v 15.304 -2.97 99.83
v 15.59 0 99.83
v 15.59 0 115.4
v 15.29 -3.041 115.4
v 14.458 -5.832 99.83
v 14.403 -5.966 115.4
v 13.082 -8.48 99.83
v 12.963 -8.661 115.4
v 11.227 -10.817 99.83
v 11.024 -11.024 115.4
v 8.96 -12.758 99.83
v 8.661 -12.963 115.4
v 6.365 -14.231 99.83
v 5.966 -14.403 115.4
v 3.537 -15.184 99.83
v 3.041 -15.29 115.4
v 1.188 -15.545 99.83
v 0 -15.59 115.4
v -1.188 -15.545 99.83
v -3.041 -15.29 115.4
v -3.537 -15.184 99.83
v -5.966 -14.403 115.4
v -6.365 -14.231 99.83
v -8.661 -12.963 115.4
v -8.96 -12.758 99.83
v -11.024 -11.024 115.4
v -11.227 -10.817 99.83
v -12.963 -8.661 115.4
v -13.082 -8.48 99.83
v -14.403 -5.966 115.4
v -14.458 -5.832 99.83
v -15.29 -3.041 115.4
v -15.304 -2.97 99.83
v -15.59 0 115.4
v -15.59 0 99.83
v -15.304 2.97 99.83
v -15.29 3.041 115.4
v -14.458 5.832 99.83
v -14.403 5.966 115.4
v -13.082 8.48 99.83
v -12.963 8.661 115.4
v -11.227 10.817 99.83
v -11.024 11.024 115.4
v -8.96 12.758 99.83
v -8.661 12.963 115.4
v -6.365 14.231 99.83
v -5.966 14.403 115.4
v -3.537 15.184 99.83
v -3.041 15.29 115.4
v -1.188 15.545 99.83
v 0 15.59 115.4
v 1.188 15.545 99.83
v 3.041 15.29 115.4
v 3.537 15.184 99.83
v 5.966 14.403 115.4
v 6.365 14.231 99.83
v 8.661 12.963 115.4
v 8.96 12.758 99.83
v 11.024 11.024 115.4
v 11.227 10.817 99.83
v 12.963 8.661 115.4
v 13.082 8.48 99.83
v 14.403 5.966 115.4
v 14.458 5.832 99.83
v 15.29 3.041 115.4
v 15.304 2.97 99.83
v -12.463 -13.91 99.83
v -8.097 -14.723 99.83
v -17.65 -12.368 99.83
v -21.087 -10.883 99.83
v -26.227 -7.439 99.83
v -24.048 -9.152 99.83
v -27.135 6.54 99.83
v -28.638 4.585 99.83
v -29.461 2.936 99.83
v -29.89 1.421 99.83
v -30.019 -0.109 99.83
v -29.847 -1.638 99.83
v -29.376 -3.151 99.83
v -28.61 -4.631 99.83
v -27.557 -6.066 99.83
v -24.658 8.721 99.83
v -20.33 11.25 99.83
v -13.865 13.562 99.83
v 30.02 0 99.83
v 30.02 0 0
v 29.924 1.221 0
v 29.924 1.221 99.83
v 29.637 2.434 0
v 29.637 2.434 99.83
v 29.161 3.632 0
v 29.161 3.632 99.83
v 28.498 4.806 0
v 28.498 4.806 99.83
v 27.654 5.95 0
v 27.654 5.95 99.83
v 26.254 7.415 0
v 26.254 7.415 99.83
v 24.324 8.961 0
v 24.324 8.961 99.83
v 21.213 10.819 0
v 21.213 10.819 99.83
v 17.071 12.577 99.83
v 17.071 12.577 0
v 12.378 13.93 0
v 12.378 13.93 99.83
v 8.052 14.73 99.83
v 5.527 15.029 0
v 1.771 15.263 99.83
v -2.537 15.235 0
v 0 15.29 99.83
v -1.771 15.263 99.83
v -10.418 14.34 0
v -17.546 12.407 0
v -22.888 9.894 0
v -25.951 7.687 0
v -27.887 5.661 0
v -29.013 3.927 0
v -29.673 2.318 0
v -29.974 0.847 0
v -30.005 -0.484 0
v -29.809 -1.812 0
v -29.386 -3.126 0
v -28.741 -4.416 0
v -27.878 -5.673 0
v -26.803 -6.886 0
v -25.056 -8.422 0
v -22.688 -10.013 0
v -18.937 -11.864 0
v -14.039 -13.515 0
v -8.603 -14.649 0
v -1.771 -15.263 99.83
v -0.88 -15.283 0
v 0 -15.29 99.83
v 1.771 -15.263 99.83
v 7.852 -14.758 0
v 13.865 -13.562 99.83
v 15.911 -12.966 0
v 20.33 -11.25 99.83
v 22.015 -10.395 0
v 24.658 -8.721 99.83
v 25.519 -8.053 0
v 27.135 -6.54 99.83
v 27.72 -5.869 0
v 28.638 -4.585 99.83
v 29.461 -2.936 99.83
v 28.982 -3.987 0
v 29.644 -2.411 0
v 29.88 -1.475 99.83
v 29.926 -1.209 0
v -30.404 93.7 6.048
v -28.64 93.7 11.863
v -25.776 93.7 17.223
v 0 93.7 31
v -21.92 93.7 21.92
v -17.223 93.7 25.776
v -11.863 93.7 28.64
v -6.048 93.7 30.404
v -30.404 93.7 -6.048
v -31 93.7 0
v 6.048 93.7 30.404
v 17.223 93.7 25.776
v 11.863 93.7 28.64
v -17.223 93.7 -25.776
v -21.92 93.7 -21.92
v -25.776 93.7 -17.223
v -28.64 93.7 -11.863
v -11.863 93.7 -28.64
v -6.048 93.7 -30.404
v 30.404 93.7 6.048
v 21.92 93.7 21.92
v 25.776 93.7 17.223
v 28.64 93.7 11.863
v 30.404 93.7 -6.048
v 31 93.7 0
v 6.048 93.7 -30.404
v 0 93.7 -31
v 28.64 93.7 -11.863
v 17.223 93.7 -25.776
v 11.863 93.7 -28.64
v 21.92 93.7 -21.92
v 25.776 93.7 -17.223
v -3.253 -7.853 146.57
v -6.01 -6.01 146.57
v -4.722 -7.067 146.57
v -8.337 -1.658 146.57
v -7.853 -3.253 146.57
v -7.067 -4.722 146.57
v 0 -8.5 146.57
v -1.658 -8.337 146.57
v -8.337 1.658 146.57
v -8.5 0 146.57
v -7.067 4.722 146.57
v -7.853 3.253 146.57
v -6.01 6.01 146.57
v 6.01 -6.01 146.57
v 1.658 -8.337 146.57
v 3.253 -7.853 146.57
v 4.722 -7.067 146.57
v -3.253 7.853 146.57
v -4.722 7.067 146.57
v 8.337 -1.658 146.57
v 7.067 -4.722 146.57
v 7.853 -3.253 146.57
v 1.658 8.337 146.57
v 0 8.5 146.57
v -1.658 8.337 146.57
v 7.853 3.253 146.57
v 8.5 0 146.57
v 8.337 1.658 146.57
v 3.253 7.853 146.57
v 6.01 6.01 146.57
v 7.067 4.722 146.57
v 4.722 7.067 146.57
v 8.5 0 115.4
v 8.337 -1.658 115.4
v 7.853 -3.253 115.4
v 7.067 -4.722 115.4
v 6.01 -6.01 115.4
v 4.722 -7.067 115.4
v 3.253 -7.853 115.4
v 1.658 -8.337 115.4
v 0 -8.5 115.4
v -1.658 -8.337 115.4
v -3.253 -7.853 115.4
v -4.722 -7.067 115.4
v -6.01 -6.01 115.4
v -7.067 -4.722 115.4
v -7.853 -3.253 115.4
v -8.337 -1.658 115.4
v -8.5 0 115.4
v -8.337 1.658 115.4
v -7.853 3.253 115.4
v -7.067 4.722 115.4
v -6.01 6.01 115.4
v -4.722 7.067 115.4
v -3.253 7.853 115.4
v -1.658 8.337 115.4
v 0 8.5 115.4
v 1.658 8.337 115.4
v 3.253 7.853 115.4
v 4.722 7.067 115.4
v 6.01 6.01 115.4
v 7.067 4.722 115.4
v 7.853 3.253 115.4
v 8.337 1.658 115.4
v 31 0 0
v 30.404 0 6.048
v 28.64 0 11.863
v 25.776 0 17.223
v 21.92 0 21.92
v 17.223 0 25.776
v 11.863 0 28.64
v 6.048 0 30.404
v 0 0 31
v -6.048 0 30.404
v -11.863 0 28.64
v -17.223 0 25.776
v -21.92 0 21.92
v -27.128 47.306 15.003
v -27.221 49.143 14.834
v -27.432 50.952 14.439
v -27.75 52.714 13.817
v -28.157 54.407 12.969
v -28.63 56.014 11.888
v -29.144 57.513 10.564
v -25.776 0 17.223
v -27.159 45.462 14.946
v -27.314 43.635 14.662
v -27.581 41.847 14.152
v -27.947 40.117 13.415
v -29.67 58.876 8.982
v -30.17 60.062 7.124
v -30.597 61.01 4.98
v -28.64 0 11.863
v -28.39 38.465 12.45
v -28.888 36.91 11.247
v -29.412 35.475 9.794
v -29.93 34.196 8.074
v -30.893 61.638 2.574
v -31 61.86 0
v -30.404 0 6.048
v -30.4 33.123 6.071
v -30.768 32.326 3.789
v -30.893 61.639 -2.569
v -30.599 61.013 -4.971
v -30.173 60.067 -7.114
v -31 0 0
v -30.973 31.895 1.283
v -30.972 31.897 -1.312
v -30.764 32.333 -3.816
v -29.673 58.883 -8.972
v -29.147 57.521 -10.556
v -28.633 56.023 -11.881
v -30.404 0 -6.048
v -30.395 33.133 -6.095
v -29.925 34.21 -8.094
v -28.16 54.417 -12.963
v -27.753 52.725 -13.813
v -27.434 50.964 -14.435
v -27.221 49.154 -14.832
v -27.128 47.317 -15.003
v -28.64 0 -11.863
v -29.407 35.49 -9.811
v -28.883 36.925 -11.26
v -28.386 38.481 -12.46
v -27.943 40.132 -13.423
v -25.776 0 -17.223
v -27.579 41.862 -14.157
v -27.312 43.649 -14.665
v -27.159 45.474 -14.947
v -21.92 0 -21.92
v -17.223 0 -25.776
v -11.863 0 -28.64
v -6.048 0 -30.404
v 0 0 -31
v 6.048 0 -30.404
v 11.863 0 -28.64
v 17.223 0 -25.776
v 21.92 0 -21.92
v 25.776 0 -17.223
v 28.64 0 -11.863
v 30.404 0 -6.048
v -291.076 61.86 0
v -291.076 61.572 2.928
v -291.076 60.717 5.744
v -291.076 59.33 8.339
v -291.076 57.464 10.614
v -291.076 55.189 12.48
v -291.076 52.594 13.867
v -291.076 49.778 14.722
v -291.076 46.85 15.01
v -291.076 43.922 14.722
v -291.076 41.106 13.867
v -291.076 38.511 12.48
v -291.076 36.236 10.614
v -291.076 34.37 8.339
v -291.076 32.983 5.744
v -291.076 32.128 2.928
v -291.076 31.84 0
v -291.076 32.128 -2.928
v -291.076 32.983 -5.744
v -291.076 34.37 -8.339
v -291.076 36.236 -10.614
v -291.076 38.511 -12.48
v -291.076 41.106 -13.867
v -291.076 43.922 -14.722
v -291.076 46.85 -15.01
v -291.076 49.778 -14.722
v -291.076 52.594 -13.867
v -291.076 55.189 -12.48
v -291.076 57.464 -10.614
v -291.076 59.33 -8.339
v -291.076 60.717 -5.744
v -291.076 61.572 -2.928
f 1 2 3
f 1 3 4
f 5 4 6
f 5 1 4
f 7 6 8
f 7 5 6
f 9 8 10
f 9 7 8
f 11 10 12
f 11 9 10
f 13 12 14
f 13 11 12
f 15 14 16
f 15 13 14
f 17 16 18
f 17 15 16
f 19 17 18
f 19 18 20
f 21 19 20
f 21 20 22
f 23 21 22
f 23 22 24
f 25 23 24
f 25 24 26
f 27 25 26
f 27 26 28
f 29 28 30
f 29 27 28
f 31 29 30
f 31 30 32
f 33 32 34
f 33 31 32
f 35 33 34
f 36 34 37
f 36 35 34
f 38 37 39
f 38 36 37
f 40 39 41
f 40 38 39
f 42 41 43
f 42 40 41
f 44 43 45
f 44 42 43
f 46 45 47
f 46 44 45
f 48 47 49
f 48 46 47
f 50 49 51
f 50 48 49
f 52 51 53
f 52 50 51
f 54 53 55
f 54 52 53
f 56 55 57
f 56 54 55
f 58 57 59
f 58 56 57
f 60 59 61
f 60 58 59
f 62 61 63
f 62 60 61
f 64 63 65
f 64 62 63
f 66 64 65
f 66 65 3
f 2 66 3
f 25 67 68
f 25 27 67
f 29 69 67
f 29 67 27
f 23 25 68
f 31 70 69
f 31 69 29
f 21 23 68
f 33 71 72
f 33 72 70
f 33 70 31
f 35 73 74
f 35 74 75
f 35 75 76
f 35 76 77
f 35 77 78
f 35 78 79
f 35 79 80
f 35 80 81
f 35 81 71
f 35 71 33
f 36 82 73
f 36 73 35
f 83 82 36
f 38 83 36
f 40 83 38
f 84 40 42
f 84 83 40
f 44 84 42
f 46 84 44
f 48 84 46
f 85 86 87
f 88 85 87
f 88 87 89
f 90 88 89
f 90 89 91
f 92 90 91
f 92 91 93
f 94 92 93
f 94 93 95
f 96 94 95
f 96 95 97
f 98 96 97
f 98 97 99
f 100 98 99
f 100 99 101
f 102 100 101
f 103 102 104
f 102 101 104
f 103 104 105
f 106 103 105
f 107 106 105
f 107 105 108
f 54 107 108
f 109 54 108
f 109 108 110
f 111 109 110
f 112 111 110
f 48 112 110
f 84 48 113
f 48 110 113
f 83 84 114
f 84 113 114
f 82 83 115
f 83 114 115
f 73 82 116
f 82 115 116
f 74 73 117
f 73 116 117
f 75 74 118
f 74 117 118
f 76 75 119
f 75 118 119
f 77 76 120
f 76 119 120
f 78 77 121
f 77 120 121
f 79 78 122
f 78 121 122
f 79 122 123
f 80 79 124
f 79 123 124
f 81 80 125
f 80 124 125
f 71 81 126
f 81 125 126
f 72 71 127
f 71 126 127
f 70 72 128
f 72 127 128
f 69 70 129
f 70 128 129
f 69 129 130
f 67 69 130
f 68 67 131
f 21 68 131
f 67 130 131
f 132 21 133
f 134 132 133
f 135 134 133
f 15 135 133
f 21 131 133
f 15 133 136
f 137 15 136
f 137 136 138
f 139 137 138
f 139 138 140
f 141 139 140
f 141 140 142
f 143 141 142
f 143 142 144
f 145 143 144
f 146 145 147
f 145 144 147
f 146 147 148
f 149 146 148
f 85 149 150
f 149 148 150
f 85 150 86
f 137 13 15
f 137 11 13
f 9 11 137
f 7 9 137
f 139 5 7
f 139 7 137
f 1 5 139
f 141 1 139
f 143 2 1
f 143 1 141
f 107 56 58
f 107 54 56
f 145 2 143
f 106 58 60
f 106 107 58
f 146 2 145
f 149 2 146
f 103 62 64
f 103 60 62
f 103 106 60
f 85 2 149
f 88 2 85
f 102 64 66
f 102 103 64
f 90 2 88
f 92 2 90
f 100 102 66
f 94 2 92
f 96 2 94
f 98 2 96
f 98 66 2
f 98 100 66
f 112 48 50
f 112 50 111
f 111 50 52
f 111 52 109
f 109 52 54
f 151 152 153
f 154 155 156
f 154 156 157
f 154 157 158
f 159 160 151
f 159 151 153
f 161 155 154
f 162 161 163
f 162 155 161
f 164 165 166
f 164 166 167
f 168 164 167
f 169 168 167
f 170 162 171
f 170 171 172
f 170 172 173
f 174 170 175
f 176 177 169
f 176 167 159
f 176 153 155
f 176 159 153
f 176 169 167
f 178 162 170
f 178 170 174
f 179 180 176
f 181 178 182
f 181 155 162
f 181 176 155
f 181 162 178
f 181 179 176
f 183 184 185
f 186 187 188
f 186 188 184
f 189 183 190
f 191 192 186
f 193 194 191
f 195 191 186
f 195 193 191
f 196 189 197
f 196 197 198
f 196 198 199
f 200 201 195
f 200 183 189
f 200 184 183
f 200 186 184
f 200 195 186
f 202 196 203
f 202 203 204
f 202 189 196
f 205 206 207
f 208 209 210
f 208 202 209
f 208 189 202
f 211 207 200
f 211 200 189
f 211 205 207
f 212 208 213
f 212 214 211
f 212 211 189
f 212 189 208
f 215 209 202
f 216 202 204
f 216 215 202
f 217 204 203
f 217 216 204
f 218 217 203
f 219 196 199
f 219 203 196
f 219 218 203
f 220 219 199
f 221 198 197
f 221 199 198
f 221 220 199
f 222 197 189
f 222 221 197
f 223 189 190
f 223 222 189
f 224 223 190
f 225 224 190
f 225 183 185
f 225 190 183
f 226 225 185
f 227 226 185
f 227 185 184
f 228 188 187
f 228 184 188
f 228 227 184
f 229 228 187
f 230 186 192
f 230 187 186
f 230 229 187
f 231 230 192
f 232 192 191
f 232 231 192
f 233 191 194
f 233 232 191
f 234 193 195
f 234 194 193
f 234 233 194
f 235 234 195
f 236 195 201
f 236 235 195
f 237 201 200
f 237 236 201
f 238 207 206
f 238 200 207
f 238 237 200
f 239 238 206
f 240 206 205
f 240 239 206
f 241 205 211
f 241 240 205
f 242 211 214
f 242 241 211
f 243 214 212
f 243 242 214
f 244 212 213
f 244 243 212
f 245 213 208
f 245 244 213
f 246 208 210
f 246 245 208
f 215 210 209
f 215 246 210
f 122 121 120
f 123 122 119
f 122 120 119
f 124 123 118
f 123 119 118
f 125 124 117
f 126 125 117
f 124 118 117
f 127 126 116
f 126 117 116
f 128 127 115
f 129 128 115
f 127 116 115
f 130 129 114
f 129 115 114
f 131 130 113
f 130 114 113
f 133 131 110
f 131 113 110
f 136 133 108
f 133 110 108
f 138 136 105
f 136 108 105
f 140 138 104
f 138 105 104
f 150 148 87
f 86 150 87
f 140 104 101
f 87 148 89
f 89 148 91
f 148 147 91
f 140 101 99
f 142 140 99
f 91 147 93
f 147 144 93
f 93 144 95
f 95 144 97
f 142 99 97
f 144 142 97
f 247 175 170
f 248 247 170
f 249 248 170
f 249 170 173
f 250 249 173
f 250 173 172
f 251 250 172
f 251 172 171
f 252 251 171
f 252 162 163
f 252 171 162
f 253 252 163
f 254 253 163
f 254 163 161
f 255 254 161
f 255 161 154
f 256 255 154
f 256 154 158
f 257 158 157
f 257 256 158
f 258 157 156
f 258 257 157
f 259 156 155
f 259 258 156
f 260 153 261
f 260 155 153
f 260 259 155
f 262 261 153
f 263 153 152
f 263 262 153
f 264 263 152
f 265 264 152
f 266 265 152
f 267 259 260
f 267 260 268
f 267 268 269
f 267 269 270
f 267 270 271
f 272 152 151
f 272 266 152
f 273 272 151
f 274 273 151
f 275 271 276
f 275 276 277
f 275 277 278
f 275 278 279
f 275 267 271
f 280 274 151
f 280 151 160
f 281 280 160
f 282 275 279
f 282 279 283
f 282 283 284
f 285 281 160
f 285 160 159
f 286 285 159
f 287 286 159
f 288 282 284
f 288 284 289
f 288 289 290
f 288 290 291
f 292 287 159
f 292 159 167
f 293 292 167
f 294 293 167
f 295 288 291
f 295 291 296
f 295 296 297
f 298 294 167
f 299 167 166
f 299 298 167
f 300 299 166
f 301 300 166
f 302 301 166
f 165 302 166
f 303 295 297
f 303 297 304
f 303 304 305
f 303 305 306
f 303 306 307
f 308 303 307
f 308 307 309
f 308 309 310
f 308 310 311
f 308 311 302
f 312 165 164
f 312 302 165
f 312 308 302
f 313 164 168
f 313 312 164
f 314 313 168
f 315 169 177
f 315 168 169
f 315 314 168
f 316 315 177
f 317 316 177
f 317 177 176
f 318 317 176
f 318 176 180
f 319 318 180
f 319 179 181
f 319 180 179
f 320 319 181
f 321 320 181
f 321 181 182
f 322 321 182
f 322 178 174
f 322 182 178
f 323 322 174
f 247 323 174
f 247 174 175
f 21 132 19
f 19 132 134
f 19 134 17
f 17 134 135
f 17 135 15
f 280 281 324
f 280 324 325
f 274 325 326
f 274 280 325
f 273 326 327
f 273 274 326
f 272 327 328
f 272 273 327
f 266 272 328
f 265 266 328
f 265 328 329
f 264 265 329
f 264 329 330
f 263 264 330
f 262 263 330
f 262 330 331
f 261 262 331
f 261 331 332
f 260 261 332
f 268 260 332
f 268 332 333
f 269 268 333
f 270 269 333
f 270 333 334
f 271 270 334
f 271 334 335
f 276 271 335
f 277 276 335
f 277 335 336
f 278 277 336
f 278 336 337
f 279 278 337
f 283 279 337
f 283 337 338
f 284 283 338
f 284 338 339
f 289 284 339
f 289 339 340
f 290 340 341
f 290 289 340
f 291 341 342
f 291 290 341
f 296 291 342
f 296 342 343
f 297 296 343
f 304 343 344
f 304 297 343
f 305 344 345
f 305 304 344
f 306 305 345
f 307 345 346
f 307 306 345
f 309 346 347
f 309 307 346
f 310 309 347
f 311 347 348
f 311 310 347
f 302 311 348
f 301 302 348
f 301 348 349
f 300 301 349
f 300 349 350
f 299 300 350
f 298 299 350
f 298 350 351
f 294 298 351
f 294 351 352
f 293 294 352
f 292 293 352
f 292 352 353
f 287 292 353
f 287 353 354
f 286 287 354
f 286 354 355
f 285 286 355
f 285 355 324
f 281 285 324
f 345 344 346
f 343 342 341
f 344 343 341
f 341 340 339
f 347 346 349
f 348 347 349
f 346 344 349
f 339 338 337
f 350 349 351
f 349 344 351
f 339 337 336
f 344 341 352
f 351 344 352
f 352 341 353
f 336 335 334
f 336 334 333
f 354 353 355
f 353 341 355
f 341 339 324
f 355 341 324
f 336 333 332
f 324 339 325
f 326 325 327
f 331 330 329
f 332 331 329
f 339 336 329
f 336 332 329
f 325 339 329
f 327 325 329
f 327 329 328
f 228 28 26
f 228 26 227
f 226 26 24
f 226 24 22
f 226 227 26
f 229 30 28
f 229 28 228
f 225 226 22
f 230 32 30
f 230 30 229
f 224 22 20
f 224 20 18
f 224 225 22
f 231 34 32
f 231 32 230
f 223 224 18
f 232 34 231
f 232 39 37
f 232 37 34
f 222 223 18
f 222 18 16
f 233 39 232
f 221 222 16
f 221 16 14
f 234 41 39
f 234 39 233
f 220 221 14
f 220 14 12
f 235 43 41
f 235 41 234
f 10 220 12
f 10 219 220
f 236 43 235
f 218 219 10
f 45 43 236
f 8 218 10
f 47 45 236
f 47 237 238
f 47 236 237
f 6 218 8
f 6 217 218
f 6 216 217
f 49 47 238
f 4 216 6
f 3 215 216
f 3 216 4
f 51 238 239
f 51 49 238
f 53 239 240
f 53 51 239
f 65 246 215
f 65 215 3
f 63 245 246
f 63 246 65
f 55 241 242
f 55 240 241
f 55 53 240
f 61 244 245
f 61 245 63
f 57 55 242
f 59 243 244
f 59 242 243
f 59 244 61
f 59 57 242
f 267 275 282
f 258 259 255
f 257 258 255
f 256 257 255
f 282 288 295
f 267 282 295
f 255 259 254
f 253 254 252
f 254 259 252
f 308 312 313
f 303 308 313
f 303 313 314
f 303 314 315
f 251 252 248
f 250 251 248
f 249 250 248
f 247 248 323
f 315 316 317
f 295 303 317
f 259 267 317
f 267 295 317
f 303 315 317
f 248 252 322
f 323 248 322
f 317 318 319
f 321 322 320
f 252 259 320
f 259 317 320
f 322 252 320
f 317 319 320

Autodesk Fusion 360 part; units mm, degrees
sketch "Sketch1" plane through (0, 0, 0) normal (0, 0, 1) x (1, 0, 0)
  ellipse E0 centre (0, 0) end of major axis (30.02, 0) minor radius 15.29
  line L0 (-30.02, 0) -> (30.02, 0) construction
  line L1 (0, -15.29) -> (0, 15.29) construction
  dimension "d1" = 60.04
  dimension "d2" = 30.58
extrude "Extrude1" add sketch "Sketch1" along normal blind 99.83 makes body 1
sketch "Sketch2" plane through (0, 0, 0) normal (0, 0, 1) x (1, 0, 0)
  circle A0 centre (0, 0) radius 15.59
  dimension "d5" = 31.18
extrude "Extrude3" add sketch "Sketch2" along normal blind 15.57 from surface at 99.83 bodies 1
sketch "Sketch3" plane through (0, 0, 0) normal (0, 0, 1) x (1, 0, 0)
  circle A0 centre (0, 0) radius 8.5
  dimension "d23" = 17
extrude "Extrude4" add sketch "Sketch3" along normal blind 31.17 from surface at 115.4 bodies 1
sketch "Sketch5" plane through (0, 0, 0) normal (0, 1, 0) x (1, 0, 0)
  circle A0 centre (0, 0) radius 31
  dimension "d27" = 62
extrude "Extrude5" add sketch "Sketch5" along normal blind 93.7 separate body makes body 2
sketch "Sketch6" plane through (0, 0, 0) normal (1, 0, 0) x (0, 1, 0)
  line L0 (0, 0) -> (46.85, 0) construction
  circle A0 centre (46.85, 0) radius 15.01
  dimension "d30" = 46.85
  dimension "d31" = 30.02
extrude "Extrude6" add sketch "Sketch6" against normal blind 264.12 from surface at -26.9565 bodies 2
copy_body "Body->Comp1" bodies 2 removing the originals makes body 3 in component "Component"
copy_body "Body->Comp2" bodies 1 removing the originals makes body 4 in component "Component'"
copy_body "Body->Comp1'" bodies 4 removing the originals makes body 5 in component "Component''"
component "Component" placed x (1, 0, 0) y (0, 1, 0) z (0, 0, 1) at (0, 0, 0)
component "Component'" placed x (1, 0, 0) y (0, 1, 0) z (0, 0, 1) at (0, 0, 0)
component "Component''" placed x (1, 0, 0) y (0, 1, 0) z (0, 0, 1) at (0, 0, 0) in component "Component'"
equation "d1 = container_half_length * 2"
equation "d2 = container_half_width * 2"
equation "d5 = cap_radius * 2"
equation "container_half_width = 15.29 mm"
equation "container_half_length = 30.02 mm"
equation "container_height = 99.83 mm"
equation "cap_radius = 15.59 mm"
equation "cap_height = 15.57 mm"
equation "tip_radius = 8.5 mm"
equation "tip_height = 31.17 mm"
equation "handle_radius = 15.01 mm"
equation "handle_length = 264.12 mm"
equation "sledge_radius = 31 mm"
equation "sledge_length = 93.7 mm"
equation "d20 = container_height"
equation "d21 = cap_height"
equation "d23 = tip_radius * 2"
equation "d24 = cap_height + container_height"
equation "d25 = tip_height"
equation "d27 = sledge_radius * 2"
equation "d28 = sledge_length"
equation "d30 = sledge_length / 2"
equation "d31 = handle_radius * 2"
equation "d32 = sledge_radius / 1.15 * -1"
equation "d33 = handle_length * -1"
